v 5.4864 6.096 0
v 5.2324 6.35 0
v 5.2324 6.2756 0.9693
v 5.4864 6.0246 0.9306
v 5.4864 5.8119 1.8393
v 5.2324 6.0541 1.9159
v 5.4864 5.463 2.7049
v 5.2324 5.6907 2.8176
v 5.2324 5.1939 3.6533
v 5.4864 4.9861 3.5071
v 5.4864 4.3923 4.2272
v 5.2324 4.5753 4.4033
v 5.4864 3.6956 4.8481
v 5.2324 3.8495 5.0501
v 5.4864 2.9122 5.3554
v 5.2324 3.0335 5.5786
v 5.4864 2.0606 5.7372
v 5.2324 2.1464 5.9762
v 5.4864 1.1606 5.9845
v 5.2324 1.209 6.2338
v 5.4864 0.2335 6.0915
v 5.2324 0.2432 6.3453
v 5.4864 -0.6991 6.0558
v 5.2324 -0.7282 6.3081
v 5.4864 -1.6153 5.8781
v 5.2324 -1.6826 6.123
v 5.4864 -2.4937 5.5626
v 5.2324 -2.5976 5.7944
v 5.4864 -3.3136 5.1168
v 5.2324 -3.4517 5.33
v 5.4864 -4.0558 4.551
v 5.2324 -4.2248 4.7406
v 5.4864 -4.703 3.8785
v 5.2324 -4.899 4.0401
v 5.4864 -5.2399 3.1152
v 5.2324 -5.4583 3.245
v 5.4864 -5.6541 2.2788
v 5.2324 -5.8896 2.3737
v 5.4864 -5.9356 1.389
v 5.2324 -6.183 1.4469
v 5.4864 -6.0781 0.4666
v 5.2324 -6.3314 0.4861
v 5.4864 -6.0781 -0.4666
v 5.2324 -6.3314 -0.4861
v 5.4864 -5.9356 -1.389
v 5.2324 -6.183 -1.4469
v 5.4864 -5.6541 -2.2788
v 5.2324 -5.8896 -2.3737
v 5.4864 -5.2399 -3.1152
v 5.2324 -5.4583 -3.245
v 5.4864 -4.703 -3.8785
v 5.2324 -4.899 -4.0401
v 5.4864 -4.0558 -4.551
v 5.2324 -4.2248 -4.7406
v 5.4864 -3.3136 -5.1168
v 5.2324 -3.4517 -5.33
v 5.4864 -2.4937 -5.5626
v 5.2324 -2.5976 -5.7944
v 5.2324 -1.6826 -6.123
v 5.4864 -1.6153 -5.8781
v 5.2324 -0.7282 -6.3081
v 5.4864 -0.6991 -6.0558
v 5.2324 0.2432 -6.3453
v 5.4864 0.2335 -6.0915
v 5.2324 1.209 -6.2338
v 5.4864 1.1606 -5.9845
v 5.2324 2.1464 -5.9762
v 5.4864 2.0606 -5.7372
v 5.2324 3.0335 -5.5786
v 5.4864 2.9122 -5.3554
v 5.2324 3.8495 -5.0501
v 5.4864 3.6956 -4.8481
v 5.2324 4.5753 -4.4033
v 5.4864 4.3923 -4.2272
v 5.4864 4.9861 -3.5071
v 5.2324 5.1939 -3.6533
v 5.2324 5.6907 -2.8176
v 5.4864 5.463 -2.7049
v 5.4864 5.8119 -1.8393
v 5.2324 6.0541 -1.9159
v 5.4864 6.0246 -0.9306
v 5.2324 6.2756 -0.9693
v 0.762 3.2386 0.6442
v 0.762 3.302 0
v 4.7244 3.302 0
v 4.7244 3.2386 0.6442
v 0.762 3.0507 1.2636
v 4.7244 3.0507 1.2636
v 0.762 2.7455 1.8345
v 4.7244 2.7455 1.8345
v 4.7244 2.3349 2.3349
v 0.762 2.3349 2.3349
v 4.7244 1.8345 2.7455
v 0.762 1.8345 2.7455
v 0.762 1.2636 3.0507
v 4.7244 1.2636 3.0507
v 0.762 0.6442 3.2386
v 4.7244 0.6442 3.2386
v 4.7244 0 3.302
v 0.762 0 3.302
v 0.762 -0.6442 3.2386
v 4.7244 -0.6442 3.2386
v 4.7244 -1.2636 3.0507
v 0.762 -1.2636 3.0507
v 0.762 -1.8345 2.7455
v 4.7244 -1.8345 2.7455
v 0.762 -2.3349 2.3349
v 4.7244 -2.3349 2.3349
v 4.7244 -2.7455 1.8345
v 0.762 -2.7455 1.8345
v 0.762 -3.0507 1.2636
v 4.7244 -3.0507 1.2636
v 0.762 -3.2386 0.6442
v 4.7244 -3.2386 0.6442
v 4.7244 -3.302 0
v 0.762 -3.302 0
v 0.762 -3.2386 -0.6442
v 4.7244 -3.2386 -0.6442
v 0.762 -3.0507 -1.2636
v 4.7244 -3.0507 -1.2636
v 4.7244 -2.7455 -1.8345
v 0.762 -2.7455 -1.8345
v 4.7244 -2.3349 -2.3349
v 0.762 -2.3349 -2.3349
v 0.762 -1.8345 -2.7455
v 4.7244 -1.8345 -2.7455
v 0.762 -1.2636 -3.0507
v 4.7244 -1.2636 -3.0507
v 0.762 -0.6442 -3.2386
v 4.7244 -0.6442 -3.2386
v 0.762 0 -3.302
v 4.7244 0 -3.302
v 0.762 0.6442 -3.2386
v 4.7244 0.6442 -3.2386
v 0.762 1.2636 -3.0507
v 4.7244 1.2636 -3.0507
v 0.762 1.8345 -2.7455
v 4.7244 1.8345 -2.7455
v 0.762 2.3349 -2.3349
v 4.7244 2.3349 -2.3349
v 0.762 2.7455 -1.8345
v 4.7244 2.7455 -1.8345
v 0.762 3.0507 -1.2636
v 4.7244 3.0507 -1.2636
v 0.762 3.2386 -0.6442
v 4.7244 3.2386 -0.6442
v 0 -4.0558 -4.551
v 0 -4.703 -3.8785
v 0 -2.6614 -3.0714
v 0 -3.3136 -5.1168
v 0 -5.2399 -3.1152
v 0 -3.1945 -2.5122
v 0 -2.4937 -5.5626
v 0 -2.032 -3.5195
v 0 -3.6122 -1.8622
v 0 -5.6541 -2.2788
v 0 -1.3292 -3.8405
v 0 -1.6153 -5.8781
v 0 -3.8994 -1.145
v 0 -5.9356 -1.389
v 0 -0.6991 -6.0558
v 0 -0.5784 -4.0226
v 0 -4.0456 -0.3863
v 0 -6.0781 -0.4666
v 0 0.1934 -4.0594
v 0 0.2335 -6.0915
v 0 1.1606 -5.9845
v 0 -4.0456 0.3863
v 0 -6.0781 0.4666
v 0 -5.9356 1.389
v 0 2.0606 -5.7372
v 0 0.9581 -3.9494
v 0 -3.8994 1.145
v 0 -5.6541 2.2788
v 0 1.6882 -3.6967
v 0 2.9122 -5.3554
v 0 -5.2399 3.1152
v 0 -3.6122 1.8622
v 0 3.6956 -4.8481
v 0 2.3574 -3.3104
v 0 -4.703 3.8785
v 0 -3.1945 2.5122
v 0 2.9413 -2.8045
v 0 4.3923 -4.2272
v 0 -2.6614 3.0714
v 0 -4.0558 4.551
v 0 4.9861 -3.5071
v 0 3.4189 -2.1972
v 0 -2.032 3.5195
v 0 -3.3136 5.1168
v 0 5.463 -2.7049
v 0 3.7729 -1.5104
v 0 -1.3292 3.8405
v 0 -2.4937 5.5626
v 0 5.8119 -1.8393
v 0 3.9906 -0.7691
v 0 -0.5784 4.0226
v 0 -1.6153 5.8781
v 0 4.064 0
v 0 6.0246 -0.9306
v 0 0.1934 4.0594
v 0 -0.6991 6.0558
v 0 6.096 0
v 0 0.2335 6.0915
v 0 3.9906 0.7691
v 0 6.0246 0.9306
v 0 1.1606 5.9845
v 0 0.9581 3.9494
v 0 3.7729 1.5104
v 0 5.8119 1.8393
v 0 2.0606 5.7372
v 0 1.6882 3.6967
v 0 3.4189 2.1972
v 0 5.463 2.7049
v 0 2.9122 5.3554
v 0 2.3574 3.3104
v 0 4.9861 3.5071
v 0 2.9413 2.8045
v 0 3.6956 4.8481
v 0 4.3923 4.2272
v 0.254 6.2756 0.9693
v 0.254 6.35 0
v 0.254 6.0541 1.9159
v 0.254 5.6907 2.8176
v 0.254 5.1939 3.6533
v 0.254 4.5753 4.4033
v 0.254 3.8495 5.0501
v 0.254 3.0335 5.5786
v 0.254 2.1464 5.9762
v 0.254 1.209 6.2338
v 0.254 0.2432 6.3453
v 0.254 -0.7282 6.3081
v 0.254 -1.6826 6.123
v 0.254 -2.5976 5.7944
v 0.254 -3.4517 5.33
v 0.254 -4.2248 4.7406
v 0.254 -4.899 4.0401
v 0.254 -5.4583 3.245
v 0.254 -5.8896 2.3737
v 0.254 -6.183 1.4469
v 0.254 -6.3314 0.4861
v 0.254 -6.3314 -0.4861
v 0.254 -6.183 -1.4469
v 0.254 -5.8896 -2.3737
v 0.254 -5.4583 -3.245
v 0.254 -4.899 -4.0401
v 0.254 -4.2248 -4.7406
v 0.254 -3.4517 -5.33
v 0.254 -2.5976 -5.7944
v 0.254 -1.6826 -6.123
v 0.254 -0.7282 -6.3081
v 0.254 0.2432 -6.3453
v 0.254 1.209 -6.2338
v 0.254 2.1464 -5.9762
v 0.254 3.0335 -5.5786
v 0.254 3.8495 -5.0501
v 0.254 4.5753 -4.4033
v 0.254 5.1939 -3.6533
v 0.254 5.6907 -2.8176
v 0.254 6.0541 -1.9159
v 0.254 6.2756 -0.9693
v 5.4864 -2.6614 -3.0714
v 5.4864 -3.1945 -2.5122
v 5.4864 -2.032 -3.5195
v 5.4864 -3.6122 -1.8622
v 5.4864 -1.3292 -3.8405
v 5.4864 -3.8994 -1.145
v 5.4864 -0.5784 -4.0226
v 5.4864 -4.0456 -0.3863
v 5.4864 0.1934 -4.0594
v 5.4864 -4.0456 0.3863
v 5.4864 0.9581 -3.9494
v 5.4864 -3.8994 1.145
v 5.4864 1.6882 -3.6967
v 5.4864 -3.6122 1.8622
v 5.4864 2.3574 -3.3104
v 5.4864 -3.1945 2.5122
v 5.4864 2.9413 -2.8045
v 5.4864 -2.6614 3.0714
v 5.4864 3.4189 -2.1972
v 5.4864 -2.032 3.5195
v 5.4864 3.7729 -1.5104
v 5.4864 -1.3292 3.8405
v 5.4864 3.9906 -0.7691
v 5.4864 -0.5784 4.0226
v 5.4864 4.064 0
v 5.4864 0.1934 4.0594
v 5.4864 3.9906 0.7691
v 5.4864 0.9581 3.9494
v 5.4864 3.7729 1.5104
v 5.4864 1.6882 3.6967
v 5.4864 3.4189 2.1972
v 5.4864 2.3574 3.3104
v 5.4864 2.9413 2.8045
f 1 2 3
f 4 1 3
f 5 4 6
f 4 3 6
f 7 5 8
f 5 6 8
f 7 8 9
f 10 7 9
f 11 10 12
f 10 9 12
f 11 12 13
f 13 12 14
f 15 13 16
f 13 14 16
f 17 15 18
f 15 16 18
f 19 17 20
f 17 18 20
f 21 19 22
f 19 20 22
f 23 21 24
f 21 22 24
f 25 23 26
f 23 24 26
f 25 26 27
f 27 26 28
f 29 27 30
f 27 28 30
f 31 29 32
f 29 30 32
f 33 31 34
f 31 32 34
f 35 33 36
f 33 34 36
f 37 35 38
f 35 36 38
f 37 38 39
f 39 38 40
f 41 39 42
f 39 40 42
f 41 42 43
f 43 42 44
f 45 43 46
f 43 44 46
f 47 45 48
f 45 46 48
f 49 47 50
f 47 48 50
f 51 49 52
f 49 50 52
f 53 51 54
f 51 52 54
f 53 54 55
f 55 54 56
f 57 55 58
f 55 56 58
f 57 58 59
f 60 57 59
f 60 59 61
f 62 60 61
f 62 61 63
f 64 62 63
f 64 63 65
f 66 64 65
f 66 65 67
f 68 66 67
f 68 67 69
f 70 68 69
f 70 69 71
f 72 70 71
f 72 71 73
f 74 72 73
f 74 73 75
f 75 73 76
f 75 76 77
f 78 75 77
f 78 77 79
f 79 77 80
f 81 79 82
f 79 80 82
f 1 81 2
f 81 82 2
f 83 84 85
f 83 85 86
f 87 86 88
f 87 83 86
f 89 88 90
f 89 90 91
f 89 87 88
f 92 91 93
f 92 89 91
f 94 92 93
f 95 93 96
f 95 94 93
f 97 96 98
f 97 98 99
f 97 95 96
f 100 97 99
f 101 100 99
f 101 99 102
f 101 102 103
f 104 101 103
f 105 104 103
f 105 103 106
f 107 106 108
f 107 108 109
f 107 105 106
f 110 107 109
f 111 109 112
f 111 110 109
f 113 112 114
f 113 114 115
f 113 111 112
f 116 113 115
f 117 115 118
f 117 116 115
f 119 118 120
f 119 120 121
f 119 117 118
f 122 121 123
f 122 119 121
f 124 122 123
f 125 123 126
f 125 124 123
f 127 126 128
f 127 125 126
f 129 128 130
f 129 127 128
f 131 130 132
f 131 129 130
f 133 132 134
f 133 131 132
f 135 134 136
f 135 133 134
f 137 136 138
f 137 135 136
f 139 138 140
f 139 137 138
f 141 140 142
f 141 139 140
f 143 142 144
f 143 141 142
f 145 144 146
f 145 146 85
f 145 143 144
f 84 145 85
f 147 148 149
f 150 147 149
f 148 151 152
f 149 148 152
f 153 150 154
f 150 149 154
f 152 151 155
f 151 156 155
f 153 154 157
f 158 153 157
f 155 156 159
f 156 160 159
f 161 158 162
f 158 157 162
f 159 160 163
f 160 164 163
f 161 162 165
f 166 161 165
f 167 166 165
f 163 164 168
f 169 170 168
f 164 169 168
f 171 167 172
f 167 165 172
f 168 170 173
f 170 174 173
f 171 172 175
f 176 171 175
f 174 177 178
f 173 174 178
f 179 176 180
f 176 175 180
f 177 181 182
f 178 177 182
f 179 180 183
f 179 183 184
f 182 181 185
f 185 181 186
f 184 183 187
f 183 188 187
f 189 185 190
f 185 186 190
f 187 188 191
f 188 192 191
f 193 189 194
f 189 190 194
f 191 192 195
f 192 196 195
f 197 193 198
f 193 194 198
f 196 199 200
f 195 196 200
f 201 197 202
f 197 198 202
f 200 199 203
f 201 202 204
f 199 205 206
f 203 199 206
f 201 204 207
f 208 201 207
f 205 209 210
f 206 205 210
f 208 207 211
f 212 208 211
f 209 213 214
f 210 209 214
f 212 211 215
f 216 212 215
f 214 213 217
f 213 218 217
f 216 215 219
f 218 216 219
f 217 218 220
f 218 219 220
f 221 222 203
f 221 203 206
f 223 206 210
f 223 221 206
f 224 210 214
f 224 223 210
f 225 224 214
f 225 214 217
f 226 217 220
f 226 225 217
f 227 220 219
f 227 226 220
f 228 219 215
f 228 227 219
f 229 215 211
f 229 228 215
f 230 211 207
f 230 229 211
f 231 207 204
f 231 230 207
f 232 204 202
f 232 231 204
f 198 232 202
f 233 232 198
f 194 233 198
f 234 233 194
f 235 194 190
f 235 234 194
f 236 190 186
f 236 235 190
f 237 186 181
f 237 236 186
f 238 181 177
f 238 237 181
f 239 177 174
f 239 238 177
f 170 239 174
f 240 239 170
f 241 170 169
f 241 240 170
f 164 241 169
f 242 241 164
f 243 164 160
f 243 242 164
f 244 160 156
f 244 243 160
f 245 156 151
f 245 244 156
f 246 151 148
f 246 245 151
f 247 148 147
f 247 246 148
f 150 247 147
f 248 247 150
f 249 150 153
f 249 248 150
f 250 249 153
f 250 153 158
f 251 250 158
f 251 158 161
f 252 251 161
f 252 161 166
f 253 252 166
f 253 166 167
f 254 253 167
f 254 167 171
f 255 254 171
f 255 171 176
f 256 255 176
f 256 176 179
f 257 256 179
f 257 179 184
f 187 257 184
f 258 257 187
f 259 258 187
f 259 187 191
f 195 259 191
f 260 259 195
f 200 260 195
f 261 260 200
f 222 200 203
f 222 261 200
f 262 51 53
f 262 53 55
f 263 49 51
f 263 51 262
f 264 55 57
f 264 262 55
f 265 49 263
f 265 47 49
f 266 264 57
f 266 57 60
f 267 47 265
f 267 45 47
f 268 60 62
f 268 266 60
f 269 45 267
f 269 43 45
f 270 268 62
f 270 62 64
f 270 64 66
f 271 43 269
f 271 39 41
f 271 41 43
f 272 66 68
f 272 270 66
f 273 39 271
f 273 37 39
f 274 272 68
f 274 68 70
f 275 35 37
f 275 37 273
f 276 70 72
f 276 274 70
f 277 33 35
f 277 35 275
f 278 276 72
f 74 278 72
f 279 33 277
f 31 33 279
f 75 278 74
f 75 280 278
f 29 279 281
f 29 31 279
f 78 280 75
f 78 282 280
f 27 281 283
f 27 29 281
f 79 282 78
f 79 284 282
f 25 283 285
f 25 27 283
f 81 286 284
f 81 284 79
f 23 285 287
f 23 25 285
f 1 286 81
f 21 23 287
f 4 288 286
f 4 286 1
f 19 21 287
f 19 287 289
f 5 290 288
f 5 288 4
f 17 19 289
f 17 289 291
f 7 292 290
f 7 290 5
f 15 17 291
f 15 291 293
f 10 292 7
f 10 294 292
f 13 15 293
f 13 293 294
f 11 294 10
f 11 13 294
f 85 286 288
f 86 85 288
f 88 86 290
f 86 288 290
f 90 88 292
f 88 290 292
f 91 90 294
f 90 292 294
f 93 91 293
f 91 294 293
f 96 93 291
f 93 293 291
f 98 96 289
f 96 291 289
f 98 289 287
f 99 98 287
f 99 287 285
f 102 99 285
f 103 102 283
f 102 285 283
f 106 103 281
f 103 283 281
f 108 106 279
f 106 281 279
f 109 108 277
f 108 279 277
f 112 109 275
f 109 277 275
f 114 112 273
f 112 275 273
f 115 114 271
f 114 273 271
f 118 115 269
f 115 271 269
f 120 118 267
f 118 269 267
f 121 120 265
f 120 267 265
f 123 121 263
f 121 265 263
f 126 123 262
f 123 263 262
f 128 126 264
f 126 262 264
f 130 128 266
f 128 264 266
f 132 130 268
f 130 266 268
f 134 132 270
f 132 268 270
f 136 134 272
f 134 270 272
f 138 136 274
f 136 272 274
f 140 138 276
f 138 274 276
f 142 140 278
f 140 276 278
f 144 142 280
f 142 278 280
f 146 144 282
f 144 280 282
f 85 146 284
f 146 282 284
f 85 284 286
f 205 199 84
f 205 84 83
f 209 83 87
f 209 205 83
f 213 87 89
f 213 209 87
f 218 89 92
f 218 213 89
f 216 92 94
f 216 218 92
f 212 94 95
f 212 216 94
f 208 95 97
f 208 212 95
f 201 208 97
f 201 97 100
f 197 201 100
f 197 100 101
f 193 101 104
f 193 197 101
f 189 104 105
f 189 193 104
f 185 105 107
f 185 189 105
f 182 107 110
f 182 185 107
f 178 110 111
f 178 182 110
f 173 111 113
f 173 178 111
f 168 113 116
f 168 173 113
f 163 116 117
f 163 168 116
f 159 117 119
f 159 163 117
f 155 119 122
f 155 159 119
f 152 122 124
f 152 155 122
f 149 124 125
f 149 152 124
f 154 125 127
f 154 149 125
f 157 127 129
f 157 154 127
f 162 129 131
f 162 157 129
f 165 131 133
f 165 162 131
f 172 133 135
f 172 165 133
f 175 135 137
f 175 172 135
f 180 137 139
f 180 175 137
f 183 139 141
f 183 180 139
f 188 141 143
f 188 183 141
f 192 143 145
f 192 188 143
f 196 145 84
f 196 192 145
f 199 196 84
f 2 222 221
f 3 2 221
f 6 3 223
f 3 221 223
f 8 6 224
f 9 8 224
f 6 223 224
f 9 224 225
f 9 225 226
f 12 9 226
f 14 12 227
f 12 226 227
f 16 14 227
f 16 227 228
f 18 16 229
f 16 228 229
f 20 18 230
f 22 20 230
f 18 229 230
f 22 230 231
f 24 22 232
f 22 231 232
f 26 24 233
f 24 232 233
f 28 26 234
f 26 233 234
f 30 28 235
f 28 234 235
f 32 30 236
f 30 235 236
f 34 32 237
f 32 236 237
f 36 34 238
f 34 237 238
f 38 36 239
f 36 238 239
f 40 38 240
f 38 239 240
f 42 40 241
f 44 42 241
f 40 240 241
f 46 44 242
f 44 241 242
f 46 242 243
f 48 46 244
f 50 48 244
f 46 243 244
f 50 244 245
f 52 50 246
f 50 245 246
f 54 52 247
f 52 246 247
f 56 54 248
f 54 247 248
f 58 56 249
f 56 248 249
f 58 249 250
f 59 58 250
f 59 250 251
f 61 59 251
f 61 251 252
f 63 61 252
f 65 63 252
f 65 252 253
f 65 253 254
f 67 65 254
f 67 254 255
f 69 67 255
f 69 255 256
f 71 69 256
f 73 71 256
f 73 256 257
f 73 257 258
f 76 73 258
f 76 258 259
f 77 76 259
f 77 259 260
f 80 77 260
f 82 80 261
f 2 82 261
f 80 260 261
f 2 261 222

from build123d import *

# Parameters (mm, degrees)
F0_R     = 6.35
F0_R_2   = 3.302
F1_DEPTH = 5.4864
F2_SIZE  = 0.762
F3_SIZE  = 0.254


with BuildPart() as f1:
    # F0 (on Right) → F1 (new body)
    with BuildSketch(Plane.YZ):
        Circle(F0_R)
        Circle(F0_R_2, mode=Mode.SUBTRACT)
    extrude(amount=F1_DEPTH)

    # F2
    f2_edges = [f1.edges().sort_by_distance(p)[0] for p in [
        (5.4864, -3.302, 0),
        (0, -3.302, 0),
    ]]
    chamfer(f2_edges, length=F2_SIZE)

    # F3
    f3_edges = [f1.edges().sort_by_distance(p)[0] for p in [
        (0, -6.35, 0),
        (5.4864, -6.35, 0),
    ]]
    chamfer(f3_edges, length=F3_SIZE)


solid = f1.part
